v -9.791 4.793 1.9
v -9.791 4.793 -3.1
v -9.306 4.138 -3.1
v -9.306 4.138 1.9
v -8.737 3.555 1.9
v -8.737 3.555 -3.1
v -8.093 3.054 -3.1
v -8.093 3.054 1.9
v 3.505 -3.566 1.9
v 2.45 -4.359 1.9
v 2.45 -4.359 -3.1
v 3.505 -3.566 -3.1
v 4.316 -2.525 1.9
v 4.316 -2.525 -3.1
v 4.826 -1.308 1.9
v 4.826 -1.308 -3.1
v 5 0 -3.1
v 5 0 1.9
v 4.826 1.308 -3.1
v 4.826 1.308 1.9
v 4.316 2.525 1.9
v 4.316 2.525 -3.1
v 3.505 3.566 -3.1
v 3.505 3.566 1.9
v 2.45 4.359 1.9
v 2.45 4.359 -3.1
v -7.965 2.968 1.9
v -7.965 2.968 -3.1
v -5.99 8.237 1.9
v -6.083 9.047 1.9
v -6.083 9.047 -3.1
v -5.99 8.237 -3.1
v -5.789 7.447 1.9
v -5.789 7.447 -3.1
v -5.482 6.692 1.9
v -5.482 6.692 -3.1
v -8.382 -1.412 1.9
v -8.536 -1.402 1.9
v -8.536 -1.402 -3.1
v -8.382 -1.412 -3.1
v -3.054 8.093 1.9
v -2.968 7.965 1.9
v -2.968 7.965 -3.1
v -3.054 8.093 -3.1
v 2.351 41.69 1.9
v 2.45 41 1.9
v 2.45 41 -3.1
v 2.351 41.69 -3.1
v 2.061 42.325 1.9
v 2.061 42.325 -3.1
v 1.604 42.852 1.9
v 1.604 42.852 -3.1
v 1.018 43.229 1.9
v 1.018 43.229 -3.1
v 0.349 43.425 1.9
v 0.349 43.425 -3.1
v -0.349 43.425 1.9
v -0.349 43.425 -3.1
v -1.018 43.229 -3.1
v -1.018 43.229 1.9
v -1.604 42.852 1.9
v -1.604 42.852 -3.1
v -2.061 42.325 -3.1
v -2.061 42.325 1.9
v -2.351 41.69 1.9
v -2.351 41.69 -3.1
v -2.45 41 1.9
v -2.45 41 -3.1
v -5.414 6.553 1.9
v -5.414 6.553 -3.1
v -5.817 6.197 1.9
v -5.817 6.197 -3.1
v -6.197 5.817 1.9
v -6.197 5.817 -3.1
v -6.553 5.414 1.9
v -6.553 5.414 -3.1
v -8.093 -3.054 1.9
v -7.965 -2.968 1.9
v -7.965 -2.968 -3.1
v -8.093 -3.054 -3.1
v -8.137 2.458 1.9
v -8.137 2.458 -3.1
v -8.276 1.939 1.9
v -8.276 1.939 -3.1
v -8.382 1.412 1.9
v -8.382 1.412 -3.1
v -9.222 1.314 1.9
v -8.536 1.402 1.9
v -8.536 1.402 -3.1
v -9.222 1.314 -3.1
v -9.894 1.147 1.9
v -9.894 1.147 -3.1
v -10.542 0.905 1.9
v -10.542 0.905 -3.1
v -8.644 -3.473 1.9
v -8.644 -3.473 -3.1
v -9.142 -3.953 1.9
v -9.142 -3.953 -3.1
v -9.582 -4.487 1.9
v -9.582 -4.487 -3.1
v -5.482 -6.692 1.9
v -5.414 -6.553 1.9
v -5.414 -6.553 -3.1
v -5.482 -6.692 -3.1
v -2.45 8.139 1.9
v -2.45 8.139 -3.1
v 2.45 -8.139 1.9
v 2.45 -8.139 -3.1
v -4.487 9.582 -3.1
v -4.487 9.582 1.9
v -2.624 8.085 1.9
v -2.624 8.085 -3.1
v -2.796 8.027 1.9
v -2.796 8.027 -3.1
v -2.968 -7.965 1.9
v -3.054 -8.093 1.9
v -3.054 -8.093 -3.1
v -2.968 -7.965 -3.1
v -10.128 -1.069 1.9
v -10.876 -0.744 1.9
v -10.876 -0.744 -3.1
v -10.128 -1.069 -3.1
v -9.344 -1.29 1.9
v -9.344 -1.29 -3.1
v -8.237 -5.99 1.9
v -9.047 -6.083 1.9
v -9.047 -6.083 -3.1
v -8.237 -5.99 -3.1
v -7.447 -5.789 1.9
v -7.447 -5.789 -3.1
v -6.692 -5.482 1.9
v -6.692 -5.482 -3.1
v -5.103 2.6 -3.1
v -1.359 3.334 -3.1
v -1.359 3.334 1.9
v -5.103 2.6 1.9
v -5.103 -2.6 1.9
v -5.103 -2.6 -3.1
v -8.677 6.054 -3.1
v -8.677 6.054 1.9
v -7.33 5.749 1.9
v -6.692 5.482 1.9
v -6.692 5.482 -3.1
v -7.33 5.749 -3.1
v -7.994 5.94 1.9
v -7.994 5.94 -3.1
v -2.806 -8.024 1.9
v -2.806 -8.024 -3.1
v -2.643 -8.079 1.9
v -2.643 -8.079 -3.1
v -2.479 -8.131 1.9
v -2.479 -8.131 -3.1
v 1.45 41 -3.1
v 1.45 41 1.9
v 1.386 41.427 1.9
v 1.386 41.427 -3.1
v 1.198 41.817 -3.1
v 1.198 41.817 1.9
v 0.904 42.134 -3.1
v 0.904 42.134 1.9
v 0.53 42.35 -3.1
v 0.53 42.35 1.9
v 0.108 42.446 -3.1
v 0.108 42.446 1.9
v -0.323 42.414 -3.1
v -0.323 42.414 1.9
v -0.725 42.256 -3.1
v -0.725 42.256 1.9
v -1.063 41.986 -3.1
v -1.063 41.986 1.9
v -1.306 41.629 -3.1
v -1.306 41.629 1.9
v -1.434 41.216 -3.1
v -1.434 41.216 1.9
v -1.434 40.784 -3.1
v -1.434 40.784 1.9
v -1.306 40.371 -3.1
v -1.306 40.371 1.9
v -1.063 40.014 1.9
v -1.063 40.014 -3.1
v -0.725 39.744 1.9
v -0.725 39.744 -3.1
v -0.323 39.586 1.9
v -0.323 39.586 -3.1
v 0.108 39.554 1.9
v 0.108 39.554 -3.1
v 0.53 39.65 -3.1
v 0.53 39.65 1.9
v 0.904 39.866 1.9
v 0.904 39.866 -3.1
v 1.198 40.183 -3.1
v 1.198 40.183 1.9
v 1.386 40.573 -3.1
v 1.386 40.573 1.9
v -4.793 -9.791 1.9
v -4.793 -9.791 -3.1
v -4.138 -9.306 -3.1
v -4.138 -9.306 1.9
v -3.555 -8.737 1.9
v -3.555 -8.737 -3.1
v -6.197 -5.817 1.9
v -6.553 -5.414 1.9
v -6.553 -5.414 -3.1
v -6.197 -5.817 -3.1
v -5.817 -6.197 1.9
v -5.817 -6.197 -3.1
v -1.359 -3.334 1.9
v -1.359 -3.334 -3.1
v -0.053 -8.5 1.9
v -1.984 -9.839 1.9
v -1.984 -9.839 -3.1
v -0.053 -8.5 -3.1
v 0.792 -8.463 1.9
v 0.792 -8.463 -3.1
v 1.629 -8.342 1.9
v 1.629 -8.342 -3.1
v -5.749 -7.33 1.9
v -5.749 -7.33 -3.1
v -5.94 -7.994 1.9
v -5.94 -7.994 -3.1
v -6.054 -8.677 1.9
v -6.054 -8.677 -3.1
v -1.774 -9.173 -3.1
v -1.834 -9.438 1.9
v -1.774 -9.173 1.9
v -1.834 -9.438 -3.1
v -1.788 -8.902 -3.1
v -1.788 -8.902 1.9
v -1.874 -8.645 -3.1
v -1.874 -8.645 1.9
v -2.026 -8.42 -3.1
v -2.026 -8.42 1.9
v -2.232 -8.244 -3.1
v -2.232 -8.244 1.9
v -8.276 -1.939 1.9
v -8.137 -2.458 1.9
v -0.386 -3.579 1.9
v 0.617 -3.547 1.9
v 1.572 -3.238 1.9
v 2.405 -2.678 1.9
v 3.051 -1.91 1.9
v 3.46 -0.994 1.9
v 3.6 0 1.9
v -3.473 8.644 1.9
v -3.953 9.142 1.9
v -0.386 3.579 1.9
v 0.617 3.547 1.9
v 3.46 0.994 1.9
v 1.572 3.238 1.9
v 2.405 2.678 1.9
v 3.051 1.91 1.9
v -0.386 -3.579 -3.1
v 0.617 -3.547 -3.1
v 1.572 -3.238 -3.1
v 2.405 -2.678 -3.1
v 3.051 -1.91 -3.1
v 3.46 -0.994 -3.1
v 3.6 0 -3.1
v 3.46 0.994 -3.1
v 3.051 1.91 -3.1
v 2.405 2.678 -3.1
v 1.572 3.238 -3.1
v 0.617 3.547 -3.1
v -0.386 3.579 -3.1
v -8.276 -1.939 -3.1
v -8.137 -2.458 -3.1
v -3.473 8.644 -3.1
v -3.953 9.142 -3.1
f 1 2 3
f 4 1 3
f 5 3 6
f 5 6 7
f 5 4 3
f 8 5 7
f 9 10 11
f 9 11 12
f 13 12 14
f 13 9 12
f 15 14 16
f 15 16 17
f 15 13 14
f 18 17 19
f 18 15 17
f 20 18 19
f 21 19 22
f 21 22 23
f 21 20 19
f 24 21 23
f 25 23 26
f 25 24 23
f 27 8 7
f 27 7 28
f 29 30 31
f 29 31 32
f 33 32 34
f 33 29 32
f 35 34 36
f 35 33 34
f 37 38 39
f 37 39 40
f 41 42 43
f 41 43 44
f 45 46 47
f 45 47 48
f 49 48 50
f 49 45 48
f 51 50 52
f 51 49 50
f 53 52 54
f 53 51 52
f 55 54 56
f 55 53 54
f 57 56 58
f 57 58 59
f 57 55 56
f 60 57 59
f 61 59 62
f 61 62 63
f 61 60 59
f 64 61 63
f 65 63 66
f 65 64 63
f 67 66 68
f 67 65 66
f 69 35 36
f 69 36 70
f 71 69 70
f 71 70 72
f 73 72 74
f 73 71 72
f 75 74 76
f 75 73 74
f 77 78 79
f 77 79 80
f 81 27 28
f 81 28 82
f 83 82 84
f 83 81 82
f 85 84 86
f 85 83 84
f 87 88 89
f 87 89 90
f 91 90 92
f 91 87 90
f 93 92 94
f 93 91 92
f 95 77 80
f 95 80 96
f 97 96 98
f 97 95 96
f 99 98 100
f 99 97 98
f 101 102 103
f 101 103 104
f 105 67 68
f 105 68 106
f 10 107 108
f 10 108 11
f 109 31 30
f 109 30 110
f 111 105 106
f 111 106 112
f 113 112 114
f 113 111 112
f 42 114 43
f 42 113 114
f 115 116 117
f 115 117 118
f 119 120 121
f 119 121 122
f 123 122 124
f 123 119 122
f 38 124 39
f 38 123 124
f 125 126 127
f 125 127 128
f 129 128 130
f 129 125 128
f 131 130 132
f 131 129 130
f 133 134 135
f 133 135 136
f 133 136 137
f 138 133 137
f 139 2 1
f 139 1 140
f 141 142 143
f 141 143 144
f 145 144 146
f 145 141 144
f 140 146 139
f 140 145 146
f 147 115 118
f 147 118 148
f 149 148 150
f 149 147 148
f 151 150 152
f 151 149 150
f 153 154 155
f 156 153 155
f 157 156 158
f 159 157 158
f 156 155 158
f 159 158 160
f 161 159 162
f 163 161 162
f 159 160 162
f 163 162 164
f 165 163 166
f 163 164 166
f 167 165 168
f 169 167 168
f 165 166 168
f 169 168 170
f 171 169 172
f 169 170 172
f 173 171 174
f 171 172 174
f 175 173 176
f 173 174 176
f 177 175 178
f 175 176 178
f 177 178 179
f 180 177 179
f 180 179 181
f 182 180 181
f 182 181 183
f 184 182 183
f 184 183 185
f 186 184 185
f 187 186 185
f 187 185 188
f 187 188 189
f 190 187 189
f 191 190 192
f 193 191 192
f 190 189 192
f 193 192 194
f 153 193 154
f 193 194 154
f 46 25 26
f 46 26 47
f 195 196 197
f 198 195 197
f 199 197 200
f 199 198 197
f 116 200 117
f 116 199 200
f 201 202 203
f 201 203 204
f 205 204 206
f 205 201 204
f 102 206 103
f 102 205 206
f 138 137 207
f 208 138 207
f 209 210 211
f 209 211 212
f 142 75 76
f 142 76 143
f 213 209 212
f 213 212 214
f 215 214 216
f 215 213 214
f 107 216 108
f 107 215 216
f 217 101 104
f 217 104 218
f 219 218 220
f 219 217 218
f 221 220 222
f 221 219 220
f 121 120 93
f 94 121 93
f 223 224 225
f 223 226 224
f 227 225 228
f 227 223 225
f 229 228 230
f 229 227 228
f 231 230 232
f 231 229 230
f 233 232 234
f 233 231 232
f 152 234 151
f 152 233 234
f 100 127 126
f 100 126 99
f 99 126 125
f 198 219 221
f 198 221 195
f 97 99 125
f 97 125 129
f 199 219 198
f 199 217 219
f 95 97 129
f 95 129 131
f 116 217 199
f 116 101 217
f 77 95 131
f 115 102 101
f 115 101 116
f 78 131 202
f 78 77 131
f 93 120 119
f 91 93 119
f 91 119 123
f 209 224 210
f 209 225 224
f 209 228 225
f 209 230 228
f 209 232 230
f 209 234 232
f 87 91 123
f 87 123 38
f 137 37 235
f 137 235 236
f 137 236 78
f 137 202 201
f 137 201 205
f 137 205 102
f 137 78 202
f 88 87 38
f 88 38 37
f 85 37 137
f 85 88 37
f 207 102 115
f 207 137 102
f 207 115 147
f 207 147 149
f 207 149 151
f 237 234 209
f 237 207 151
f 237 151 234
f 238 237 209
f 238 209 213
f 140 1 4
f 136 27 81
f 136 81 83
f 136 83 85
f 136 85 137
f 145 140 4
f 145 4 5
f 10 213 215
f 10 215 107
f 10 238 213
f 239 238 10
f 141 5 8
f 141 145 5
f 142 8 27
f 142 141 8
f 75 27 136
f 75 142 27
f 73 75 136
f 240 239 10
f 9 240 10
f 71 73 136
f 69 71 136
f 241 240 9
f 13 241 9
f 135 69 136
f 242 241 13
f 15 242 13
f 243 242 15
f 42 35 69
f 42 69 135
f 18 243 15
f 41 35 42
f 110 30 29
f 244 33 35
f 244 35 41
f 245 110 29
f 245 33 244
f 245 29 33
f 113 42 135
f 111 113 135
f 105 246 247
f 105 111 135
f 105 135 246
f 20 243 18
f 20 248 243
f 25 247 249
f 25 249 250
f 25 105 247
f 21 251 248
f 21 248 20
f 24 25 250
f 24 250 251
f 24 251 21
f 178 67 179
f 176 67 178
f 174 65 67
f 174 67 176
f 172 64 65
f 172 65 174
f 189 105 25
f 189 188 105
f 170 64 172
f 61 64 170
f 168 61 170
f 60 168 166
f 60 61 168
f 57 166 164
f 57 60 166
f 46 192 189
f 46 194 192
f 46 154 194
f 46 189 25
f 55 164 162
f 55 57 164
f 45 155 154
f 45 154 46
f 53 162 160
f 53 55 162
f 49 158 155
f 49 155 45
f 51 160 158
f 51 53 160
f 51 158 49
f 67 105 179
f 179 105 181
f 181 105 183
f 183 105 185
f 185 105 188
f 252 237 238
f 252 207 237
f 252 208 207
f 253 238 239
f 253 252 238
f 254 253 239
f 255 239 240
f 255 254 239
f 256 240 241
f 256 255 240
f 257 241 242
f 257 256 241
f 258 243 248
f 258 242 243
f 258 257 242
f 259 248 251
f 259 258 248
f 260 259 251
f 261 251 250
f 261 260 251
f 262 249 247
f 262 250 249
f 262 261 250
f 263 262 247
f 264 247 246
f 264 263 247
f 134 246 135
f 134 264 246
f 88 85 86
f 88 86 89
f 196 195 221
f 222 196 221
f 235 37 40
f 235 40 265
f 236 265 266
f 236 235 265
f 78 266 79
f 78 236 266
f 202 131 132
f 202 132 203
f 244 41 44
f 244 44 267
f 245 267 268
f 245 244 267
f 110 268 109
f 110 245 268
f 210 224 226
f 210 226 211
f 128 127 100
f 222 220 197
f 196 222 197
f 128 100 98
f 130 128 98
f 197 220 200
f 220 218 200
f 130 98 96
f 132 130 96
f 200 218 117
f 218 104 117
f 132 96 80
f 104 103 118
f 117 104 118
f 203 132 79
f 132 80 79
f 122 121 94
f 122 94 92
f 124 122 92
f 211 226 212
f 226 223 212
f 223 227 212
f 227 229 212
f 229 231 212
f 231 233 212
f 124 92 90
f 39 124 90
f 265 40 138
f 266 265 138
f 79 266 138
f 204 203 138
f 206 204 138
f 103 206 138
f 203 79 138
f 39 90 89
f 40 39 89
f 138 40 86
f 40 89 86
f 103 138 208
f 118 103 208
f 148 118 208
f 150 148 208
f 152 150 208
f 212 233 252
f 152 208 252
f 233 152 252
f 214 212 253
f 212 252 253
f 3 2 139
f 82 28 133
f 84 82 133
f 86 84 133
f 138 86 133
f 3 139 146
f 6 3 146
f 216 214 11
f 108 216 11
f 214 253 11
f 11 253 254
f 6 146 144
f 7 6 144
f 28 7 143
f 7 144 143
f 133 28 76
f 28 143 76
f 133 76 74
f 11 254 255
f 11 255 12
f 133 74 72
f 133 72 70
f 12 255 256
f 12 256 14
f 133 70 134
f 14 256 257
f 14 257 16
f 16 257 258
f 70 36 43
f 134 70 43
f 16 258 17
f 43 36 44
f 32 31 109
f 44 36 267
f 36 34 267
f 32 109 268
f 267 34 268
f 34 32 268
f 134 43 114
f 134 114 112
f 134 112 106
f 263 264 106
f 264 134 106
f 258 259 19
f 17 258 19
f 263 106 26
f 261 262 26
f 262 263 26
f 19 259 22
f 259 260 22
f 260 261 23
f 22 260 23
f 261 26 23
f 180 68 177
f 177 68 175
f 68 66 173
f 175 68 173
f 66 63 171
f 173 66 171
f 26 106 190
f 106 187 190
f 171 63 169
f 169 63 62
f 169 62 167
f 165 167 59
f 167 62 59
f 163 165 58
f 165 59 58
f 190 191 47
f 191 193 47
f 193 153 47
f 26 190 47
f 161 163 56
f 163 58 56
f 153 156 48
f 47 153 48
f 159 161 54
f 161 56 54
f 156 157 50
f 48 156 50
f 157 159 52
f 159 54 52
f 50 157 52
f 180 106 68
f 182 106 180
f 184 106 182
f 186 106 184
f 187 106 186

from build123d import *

# Parameters (mm, degrees)
SKETCH1_R           = 1.45
BOSS_EXTRUDE1_DEPTH = 5
CUT_EXTRUDE2_DEPTH  = 46.350212776
SKETCH5_W           = 3.6
SKETCH5_H           = 5
FILLET1_R           = 1


with BuildPart() as part:
    # Sketch1 → Boss-Extrude1 (new body)
    with BuildSketch(Plane.XY.offset(1.9)):
        with BuildLine():
            Line((2.45, -8.139256723), (2.45, -4.358612164))
            ThreePointArc((2.45, -4.358612164), (5, 0), (2.45, 4.358612164))
            Line((2.45, 4.358612164), (2.45, 41))
            ThreePointArc((2.45, 41), (0, 43.45), (-2.45, 41))
            Line((-2.45, 41), (-2.45, 8.139256723))
            ThreePointArc((-2.45, 8.139256723), (-2.710254715, 8.056334116), (-2.967710696, 7.965092167))
            Line((-2.967710696, 7.965092167), (-3.054167872, 8.093270203))
            ThreePointArc((-3.054167872, 8.093270203), (-4.342095244, 9.472160372), (-5.994566265, 10.382893341))
            ThreePointArc((-5.994566265, 10.382893341), (-6.032083889, 8.496444973), (-5.481893659, 6.691622066))
            Line((-5.481893659, 6.691622066), (-5.414116812, 6.552658937))
            ThreePointArc((-5.414116812, 6.552658937), (-6.01040764, 6.01040764), (-6.552658937, 5.414116812))
            Line((-6.552658937, 5.414116812), (-6.691622066, 5.481893659))
            ThreePointArc((-6.691622066, 5.481893659), (-8.496444973, 6.032083889), (-10.382893341, 5.994566265))
            ThreePointArc((-10.382893341, 5.994566265), (-9.472160372, 4.342095244), (-8.093270203, 3.054167872))
            Line((-8.093270203, 3.054167872), (-7.965092167, 2.967710696))
            ThreePointArc((-7.965092167, 2.967710696), (-8.210369523, 2.199961883), (-8.381827508, 1.41243323))
            Line((-8.381827508, 1.41243323), (-8.536061531, 1.401648136))
            ThreePointArc((-8.536061531, 1.401648136), (-10.374179133, 0.975715399), (-11.989132531, 0))
            ThreePointArc((-11.989132531, 0), (-10.374179133, -0.975715399), (-8.536061531, -1.401648136))
            Line((-8.536061531, -1.401648136), (-8.381827508, -1.41243323))
            ThreePointArc((-8.381827508, -1.41243323), (-8.210369523, -2.199961883), (-7.965092167, -2.967710696))
            Line((-7.965092167, -2.967710696), (-8.093270203, -3.054167872))
            ThreePointArc((-8.093270203, -3.054167872), (-9.472160372, -4.342095244), (-10.382893341, -5.994566265))
            ThreePointArc((-10.382893341, -5.994566265), (-8.496444973, -6.032083889), (-6.691622066, -5.481893659))
            Line((-6.691622066, -5.481893659), (-6.552658937, -5.414116812))
            ThreePointArc((-6.552658937, -5.414116812), (-6.01040764, -6.01040764), (-5.414116812, -6.552658937))
            Line((-5.414116812, -6.552658937), (-5.481893659, -6.691622066))
            ThreePointArc((-5.481893659, -6.691622066), (-6.032083889, -8.496444973), (-5.994566265, -10.382893341))
            ThreePointArc((-5.994566265, -10.382893341), (-4.342095244, -9.472160372), (-3.054167872, -8.093270203))
            Line((-3.054167872, -8.093270203), (-2.967710696, -7.965092167))
            ThreePointArc((-2.967710696, -7.965092167), (-2.212026244, -8.207127384), (-1.437064557, -8.377639611))
            Line((-1.437064557, -8.377639611), (-1.984198903, -9.839001099))
            Line((-1.984198903, -9.839001099), (-0.052960828, -8.499835007))
            ThreePointArc((-0.052960828, -8.499835007), (1.212003867, -8.413147249), (2.45, -8.139256723))
        make_face()
        with Locations((0, 41)):
            Circle(SKETCH1_R, mode=Mode.SUBTRACT)
    extrude(amount=-BOSS_EXTRUDE1_DEPTH)

    # Sketch4 → Cut-Extrude2 (cut, through all)
    with BuildSketch(Plane.XY.offset(1.9)):
        with BuildLine():
            Line((-5.102940329, -2.6), (-1.358771093, -3.333727811))
            ThreePointArc((-1.358771093, -3.333727811), (-3.6, 0), (-1.358771093, 3.333727811))
            Line((-1.358771093, 3.333727811), (-5.102940329, 2.6))
            Line((-5.102940329, 2.6), (-5.102940329, -2.6))
        make_face()
    extrude(amount=-CUT_EXTRUDE2_DEPTH, mode=Mode.SUBTRACT)

    # Sketch5 → Cut-Revolve1 (revolve, cut)
    with BuildSketch(Plane(origin=(0, 0, 0), x_dir=(1, 0, 0), z_dir=(0, 1, 0))):
        with Locations((1.8, 0.6)):
            Rectangle(SKETCH5_W, SKETCH5_H)
    revolve(axis=Axis((0, 0, -3.1), (0, 0, 1)), mode=Mode.SUBTRACT)

    # Chamfer1
    # the kernel refuses this chamfer: 1.996823512, 1.412365401 mm, written as the material it takes off along each edge
    with BuildSketch(Plane(origin=(-5.994566265, -10.382893341, 6.307600342), x_dir=(0.8971018613244867, 0.44182377754953556, 0), z_dir=(0, 0, -1)), Plane(origin=(-10.382893341, -5.994566265, 6.307600342), x_dir=(0.9978248904640776, -0.06592031530834441, 0), z_dir=(0, 0, -1)), Plane(origin=(-11.989132531, 0, 6.307600342), x_dir=(0.8311815460161395, -0.5560011129145519, 0), z_dir=(0, 0, -1)), Plane(origin=(-10.382893341, 5.994566265, 6.307600342), x_dir=(0.4418237775496057, -0.8971018613244522, 0), z_dir=(0, 0, -1)), Plane(origin=(-5.994566265, 10.382893341, 6.307600342), x_dir=(-0.06592031530837167, -0.9978248904640757, 0), z_dir=(0, 0, -1))) as chamfer1_piece_1:
        with BuildLine():
            Line((1.33889649, 0), (0.700148491, -1.556942978))
            ThreePointArc((0.700148491, -1.556942978), (0.305807457, -0.828670891), (0, 0))
            ThreePointArc((0, 0), (0.684607685, 0.037444556), (1.33889649, 0))
        make_face()
    extrude(amount=13.815200684, mode=Mode.SUBTRACT)

    # Fillet1
    fillet1_edges = [part.edges().sort_by_distance(p)[0] for p in [
        (-1.437064557, -8.377639611, -0.6),
    ]]
    fillet(fillet1_edges, radius=FILLET1_R)


solid = part.part
